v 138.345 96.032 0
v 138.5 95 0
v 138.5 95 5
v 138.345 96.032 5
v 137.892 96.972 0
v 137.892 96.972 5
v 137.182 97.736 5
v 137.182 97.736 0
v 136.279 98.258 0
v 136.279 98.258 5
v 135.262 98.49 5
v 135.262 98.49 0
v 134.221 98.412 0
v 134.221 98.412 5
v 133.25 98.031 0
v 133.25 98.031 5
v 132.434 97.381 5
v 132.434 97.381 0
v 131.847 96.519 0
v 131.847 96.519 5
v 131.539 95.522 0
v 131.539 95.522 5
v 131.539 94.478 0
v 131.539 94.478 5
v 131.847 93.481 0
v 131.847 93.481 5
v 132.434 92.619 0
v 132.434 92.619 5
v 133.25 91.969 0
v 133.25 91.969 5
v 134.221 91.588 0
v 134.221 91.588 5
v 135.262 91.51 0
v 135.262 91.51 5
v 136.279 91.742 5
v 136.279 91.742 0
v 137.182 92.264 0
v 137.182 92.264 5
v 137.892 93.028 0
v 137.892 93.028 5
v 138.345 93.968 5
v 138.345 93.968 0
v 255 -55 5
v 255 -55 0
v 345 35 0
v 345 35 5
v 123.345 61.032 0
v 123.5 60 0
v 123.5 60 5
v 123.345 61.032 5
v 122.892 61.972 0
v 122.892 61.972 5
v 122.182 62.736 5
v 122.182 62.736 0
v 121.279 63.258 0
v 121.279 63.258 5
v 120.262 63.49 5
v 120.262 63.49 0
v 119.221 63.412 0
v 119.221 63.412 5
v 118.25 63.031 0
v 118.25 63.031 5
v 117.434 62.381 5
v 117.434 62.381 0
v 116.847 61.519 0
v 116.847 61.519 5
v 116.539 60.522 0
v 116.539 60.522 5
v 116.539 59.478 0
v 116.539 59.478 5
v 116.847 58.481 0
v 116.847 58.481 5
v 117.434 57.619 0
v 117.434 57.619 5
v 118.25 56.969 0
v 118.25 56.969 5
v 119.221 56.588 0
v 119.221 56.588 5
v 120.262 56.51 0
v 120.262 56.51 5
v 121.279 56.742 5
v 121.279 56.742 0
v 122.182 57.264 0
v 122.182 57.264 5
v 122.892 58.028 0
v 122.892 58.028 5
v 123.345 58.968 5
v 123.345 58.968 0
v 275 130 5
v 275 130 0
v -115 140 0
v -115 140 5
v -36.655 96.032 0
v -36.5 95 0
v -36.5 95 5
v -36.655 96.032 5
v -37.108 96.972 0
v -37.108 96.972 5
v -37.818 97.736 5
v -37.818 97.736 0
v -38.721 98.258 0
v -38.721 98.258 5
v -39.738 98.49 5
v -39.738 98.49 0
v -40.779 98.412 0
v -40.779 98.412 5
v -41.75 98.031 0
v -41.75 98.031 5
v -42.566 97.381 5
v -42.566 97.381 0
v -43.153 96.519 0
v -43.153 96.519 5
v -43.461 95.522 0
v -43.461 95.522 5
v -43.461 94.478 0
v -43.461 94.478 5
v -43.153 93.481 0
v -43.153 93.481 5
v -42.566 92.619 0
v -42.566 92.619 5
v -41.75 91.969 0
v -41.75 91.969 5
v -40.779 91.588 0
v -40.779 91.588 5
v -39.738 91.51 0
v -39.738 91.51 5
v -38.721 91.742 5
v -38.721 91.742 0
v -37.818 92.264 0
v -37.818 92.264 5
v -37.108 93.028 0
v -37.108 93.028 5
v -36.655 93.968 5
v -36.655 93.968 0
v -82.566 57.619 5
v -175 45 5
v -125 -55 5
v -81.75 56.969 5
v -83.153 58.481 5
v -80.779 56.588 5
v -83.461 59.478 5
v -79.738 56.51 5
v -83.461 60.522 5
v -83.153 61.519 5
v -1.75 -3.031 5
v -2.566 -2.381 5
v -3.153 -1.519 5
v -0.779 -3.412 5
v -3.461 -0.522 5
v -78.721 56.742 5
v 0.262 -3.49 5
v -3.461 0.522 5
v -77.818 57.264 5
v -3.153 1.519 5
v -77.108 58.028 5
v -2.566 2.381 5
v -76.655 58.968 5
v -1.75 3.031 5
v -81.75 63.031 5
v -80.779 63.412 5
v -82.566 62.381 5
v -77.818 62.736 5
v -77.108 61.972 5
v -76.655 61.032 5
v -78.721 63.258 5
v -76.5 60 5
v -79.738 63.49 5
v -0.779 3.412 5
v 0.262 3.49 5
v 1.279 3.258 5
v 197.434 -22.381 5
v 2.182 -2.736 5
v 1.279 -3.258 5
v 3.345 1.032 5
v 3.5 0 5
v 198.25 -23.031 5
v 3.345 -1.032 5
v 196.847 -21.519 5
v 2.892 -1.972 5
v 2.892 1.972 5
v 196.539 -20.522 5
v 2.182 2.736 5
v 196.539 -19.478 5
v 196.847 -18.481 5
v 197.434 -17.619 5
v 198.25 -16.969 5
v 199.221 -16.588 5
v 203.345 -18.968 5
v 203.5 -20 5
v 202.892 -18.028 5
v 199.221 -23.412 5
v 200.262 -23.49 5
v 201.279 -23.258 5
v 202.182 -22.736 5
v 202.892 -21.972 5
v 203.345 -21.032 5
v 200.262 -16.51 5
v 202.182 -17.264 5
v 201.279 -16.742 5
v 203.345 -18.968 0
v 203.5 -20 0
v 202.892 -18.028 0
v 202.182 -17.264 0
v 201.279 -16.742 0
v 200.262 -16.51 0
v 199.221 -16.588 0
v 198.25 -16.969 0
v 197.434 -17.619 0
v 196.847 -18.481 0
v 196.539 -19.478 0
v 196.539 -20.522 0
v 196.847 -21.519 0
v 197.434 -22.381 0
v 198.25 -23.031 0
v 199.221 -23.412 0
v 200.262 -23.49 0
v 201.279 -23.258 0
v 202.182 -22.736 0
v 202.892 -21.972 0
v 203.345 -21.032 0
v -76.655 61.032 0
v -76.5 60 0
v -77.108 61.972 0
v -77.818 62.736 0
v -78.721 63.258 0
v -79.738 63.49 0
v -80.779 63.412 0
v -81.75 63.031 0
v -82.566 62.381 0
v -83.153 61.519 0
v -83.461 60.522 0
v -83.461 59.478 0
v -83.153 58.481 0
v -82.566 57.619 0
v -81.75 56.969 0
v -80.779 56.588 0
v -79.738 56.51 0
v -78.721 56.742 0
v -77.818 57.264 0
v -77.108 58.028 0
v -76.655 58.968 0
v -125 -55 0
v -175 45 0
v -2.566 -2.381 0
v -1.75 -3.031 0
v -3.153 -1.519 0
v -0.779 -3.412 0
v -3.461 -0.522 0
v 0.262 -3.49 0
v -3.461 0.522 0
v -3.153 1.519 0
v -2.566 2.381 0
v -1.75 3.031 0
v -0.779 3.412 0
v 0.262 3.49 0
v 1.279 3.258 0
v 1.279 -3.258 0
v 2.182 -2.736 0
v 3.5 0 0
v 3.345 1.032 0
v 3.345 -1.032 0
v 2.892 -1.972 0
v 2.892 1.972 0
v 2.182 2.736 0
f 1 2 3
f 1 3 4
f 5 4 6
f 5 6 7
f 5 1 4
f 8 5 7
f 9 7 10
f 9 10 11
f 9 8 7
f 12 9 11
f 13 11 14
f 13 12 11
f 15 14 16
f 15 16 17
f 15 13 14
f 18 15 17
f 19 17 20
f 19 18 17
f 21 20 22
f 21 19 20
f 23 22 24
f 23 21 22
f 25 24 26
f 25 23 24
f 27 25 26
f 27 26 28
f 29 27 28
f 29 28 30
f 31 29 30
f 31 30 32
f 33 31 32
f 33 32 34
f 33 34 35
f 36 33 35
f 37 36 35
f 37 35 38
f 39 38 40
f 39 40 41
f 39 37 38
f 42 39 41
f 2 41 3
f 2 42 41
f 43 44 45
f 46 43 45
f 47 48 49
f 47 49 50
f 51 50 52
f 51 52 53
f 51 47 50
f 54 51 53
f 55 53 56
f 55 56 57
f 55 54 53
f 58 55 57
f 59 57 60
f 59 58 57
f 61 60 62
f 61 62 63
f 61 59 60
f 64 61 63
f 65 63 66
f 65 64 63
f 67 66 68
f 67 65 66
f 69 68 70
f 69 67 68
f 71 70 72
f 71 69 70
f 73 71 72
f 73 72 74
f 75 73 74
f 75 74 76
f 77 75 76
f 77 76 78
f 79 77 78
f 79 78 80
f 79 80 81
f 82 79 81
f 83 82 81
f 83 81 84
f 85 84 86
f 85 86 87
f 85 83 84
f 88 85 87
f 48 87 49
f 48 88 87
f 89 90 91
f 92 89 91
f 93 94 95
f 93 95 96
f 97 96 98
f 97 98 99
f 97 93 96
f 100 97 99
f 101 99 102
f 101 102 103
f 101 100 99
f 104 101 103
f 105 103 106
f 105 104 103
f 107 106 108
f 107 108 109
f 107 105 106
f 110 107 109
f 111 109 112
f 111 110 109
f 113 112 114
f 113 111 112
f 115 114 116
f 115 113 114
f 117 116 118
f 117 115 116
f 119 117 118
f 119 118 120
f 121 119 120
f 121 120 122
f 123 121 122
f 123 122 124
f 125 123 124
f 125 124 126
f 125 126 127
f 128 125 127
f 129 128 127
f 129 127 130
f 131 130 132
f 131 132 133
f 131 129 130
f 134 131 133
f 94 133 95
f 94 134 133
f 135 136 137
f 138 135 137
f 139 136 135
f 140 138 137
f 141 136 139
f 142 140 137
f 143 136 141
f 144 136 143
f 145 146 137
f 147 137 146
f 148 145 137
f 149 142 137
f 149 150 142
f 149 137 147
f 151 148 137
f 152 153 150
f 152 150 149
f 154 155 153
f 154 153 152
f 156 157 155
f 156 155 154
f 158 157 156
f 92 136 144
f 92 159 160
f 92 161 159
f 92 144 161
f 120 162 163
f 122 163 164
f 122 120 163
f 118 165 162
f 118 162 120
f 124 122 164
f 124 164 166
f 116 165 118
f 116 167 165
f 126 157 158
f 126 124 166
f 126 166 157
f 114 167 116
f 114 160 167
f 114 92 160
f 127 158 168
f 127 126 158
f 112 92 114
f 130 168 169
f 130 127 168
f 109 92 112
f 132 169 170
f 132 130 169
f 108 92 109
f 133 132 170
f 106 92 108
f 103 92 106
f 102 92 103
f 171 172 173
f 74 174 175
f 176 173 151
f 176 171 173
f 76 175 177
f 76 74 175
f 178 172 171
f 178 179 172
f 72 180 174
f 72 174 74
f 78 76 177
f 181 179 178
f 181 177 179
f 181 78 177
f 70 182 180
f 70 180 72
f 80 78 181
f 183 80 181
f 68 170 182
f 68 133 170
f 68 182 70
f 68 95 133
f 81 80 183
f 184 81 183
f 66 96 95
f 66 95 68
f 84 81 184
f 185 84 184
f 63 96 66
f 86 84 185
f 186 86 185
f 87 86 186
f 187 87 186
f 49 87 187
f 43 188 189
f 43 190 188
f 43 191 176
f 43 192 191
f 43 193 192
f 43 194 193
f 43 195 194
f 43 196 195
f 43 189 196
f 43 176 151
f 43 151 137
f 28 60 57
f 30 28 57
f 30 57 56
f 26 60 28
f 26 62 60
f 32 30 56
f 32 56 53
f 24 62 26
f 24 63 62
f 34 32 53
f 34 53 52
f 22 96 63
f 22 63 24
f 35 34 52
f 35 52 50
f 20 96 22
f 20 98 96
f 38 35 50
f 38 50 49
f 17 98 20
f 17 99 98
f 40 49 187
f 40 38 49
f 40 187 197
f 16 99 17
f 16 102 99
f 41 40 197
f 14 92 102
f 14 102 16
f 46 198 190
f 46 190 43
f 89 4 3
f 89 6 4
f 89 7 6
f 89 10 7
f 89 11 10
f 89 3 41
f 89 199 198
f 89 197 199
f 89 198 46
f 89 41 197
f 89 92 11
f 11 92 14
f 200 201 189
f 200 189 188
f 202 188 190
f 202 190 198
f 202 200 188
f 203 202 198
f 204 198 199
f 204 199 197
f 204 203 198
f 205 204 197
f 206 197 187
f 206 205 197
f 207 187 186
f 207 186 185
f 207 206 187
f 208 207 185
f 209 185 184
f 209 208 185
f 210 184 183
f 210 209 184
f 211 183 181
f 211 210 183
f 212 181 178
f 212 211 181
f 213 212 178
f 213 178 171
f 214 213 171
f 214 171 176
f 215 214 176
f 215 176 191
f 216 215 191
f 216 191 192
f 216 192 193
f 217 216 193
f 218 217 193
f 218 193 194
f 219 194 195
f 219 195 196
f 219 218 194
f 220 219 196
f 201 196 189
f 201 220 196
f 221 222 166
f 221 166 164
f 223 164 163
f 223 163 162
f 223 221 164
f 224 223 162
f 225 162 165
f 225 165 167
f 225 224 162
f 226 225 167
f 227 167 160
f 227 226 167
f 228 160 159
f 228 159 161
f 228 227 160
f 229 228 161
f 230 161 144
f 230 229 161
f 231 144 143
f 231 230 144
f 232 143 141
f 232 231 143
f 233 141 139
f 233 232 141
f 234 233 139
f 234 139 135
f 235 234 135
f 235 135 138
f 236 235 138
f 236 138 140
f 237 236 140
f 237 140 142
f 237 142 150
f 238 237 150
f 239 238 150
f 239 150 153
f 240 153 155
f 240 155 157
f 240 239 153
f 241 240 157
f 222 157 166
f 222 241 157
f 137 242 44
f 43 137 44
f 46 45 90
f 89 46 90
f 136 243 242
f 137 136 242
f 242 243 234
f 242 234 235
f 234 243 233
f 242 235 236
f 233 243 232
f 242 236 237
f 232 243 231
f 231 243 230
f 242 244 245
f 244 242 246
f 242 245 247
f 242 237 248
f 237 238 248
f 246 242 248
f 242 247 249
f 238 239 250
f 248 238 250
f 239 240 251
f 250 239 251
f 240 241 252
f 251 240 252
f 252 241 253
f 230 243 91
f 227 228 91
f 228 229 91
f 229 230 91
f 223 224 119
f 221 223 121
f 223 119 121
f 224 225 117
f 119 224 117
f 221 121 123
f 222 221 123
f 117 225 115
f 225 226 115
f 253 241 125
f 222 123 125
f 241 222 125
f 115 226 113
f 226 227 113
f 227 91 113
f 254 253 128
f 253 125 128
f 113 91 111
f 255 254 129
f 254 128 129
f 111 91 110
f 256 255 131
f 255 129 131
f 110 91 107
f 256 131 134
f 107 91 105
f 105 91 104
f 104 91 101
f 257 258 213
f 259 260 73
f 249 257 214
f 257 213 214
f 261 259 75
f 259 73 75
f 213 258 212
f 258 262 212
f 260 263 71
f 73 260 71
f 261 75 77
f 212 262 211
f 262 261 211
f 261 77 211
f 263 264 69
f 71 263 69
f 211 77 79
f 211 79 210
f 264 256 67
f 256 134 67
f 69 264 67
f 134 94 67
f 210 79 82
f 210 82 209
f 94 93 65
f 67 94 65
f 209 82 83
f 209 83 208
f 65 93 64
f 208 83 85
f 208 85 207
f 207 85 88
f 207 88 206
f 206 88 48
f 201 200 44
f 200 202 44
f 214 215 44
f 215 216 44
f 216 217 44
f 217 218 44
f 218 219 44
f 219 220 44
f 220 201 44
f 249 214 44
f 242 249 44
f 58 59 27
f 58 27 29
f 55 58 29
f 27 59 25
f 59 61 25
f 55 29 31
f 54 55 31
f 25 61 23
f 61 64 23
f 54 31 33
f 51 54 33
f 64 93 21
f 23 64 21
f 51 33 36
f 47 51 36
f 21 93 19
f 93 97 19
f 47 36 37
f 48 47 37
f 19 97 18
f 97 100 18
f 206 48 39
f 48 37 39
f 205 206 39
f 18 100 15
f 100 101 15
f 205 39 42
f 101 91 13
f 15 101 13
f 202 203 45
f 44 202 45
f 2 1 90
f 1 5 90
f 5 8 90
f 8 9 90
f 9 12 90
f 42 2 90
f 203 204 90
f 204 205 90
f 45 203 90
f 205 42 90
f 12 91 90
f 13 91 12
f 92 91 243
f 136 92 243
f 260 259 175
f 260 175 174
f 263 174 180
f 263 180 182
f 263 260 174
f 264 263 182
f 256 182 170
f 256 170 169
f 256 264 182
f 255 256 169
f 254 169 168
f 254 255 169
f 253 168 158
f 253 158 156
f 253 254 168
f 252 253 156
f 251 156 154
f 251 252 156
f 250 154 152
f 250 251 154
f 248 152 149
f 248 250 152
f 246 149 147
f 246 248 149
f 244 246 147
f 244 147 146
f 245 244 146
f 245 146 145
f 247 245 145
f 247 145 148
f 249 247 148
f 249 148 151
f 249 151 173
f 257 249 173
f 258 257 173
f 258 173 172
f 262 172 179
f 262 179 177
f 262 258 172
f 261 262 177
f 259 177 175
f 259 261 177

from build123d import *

# Parameters (mm, degrees)
SKETCH_1_R      = 3.5
EXTRUDE_1_DEPTH = 5


with BuildPart() as part:
    # 草图1 → 凸台-拉伸1 (new body)
    with BuildSketch(Plane.XY):
        Polygon((-175, 45), (-125, -55), (255, -55), (345, 35), (275, 130), (-115, 140), align=None)
        Circle(SKETCH_1_R, mode=Mode.SUBTRACT)
        with Locations((-80, 60)):
            Circle(SKETCH_1_R, mode=Mode.SUBTRACT)
        with Locations((120, 60)):
            Circle(SKETCH_1_R, mode=Mode.SUBTRACT)
        with Locations((200, -20)):
            Circle(SKETCH_1_R, mode=Mode.SUBTRACT)
        with Locations((-40, 95)):
            Circle(SKETCH_1_R, mode=Mode.SUBTRACT)
        with Locations((135, 95)):
            Circle(SKETCH_1_R, mode=Mode.SUBTRACT)
    extrude(amount=EXTRUDE_1_DEPTH)


solid = part.part
